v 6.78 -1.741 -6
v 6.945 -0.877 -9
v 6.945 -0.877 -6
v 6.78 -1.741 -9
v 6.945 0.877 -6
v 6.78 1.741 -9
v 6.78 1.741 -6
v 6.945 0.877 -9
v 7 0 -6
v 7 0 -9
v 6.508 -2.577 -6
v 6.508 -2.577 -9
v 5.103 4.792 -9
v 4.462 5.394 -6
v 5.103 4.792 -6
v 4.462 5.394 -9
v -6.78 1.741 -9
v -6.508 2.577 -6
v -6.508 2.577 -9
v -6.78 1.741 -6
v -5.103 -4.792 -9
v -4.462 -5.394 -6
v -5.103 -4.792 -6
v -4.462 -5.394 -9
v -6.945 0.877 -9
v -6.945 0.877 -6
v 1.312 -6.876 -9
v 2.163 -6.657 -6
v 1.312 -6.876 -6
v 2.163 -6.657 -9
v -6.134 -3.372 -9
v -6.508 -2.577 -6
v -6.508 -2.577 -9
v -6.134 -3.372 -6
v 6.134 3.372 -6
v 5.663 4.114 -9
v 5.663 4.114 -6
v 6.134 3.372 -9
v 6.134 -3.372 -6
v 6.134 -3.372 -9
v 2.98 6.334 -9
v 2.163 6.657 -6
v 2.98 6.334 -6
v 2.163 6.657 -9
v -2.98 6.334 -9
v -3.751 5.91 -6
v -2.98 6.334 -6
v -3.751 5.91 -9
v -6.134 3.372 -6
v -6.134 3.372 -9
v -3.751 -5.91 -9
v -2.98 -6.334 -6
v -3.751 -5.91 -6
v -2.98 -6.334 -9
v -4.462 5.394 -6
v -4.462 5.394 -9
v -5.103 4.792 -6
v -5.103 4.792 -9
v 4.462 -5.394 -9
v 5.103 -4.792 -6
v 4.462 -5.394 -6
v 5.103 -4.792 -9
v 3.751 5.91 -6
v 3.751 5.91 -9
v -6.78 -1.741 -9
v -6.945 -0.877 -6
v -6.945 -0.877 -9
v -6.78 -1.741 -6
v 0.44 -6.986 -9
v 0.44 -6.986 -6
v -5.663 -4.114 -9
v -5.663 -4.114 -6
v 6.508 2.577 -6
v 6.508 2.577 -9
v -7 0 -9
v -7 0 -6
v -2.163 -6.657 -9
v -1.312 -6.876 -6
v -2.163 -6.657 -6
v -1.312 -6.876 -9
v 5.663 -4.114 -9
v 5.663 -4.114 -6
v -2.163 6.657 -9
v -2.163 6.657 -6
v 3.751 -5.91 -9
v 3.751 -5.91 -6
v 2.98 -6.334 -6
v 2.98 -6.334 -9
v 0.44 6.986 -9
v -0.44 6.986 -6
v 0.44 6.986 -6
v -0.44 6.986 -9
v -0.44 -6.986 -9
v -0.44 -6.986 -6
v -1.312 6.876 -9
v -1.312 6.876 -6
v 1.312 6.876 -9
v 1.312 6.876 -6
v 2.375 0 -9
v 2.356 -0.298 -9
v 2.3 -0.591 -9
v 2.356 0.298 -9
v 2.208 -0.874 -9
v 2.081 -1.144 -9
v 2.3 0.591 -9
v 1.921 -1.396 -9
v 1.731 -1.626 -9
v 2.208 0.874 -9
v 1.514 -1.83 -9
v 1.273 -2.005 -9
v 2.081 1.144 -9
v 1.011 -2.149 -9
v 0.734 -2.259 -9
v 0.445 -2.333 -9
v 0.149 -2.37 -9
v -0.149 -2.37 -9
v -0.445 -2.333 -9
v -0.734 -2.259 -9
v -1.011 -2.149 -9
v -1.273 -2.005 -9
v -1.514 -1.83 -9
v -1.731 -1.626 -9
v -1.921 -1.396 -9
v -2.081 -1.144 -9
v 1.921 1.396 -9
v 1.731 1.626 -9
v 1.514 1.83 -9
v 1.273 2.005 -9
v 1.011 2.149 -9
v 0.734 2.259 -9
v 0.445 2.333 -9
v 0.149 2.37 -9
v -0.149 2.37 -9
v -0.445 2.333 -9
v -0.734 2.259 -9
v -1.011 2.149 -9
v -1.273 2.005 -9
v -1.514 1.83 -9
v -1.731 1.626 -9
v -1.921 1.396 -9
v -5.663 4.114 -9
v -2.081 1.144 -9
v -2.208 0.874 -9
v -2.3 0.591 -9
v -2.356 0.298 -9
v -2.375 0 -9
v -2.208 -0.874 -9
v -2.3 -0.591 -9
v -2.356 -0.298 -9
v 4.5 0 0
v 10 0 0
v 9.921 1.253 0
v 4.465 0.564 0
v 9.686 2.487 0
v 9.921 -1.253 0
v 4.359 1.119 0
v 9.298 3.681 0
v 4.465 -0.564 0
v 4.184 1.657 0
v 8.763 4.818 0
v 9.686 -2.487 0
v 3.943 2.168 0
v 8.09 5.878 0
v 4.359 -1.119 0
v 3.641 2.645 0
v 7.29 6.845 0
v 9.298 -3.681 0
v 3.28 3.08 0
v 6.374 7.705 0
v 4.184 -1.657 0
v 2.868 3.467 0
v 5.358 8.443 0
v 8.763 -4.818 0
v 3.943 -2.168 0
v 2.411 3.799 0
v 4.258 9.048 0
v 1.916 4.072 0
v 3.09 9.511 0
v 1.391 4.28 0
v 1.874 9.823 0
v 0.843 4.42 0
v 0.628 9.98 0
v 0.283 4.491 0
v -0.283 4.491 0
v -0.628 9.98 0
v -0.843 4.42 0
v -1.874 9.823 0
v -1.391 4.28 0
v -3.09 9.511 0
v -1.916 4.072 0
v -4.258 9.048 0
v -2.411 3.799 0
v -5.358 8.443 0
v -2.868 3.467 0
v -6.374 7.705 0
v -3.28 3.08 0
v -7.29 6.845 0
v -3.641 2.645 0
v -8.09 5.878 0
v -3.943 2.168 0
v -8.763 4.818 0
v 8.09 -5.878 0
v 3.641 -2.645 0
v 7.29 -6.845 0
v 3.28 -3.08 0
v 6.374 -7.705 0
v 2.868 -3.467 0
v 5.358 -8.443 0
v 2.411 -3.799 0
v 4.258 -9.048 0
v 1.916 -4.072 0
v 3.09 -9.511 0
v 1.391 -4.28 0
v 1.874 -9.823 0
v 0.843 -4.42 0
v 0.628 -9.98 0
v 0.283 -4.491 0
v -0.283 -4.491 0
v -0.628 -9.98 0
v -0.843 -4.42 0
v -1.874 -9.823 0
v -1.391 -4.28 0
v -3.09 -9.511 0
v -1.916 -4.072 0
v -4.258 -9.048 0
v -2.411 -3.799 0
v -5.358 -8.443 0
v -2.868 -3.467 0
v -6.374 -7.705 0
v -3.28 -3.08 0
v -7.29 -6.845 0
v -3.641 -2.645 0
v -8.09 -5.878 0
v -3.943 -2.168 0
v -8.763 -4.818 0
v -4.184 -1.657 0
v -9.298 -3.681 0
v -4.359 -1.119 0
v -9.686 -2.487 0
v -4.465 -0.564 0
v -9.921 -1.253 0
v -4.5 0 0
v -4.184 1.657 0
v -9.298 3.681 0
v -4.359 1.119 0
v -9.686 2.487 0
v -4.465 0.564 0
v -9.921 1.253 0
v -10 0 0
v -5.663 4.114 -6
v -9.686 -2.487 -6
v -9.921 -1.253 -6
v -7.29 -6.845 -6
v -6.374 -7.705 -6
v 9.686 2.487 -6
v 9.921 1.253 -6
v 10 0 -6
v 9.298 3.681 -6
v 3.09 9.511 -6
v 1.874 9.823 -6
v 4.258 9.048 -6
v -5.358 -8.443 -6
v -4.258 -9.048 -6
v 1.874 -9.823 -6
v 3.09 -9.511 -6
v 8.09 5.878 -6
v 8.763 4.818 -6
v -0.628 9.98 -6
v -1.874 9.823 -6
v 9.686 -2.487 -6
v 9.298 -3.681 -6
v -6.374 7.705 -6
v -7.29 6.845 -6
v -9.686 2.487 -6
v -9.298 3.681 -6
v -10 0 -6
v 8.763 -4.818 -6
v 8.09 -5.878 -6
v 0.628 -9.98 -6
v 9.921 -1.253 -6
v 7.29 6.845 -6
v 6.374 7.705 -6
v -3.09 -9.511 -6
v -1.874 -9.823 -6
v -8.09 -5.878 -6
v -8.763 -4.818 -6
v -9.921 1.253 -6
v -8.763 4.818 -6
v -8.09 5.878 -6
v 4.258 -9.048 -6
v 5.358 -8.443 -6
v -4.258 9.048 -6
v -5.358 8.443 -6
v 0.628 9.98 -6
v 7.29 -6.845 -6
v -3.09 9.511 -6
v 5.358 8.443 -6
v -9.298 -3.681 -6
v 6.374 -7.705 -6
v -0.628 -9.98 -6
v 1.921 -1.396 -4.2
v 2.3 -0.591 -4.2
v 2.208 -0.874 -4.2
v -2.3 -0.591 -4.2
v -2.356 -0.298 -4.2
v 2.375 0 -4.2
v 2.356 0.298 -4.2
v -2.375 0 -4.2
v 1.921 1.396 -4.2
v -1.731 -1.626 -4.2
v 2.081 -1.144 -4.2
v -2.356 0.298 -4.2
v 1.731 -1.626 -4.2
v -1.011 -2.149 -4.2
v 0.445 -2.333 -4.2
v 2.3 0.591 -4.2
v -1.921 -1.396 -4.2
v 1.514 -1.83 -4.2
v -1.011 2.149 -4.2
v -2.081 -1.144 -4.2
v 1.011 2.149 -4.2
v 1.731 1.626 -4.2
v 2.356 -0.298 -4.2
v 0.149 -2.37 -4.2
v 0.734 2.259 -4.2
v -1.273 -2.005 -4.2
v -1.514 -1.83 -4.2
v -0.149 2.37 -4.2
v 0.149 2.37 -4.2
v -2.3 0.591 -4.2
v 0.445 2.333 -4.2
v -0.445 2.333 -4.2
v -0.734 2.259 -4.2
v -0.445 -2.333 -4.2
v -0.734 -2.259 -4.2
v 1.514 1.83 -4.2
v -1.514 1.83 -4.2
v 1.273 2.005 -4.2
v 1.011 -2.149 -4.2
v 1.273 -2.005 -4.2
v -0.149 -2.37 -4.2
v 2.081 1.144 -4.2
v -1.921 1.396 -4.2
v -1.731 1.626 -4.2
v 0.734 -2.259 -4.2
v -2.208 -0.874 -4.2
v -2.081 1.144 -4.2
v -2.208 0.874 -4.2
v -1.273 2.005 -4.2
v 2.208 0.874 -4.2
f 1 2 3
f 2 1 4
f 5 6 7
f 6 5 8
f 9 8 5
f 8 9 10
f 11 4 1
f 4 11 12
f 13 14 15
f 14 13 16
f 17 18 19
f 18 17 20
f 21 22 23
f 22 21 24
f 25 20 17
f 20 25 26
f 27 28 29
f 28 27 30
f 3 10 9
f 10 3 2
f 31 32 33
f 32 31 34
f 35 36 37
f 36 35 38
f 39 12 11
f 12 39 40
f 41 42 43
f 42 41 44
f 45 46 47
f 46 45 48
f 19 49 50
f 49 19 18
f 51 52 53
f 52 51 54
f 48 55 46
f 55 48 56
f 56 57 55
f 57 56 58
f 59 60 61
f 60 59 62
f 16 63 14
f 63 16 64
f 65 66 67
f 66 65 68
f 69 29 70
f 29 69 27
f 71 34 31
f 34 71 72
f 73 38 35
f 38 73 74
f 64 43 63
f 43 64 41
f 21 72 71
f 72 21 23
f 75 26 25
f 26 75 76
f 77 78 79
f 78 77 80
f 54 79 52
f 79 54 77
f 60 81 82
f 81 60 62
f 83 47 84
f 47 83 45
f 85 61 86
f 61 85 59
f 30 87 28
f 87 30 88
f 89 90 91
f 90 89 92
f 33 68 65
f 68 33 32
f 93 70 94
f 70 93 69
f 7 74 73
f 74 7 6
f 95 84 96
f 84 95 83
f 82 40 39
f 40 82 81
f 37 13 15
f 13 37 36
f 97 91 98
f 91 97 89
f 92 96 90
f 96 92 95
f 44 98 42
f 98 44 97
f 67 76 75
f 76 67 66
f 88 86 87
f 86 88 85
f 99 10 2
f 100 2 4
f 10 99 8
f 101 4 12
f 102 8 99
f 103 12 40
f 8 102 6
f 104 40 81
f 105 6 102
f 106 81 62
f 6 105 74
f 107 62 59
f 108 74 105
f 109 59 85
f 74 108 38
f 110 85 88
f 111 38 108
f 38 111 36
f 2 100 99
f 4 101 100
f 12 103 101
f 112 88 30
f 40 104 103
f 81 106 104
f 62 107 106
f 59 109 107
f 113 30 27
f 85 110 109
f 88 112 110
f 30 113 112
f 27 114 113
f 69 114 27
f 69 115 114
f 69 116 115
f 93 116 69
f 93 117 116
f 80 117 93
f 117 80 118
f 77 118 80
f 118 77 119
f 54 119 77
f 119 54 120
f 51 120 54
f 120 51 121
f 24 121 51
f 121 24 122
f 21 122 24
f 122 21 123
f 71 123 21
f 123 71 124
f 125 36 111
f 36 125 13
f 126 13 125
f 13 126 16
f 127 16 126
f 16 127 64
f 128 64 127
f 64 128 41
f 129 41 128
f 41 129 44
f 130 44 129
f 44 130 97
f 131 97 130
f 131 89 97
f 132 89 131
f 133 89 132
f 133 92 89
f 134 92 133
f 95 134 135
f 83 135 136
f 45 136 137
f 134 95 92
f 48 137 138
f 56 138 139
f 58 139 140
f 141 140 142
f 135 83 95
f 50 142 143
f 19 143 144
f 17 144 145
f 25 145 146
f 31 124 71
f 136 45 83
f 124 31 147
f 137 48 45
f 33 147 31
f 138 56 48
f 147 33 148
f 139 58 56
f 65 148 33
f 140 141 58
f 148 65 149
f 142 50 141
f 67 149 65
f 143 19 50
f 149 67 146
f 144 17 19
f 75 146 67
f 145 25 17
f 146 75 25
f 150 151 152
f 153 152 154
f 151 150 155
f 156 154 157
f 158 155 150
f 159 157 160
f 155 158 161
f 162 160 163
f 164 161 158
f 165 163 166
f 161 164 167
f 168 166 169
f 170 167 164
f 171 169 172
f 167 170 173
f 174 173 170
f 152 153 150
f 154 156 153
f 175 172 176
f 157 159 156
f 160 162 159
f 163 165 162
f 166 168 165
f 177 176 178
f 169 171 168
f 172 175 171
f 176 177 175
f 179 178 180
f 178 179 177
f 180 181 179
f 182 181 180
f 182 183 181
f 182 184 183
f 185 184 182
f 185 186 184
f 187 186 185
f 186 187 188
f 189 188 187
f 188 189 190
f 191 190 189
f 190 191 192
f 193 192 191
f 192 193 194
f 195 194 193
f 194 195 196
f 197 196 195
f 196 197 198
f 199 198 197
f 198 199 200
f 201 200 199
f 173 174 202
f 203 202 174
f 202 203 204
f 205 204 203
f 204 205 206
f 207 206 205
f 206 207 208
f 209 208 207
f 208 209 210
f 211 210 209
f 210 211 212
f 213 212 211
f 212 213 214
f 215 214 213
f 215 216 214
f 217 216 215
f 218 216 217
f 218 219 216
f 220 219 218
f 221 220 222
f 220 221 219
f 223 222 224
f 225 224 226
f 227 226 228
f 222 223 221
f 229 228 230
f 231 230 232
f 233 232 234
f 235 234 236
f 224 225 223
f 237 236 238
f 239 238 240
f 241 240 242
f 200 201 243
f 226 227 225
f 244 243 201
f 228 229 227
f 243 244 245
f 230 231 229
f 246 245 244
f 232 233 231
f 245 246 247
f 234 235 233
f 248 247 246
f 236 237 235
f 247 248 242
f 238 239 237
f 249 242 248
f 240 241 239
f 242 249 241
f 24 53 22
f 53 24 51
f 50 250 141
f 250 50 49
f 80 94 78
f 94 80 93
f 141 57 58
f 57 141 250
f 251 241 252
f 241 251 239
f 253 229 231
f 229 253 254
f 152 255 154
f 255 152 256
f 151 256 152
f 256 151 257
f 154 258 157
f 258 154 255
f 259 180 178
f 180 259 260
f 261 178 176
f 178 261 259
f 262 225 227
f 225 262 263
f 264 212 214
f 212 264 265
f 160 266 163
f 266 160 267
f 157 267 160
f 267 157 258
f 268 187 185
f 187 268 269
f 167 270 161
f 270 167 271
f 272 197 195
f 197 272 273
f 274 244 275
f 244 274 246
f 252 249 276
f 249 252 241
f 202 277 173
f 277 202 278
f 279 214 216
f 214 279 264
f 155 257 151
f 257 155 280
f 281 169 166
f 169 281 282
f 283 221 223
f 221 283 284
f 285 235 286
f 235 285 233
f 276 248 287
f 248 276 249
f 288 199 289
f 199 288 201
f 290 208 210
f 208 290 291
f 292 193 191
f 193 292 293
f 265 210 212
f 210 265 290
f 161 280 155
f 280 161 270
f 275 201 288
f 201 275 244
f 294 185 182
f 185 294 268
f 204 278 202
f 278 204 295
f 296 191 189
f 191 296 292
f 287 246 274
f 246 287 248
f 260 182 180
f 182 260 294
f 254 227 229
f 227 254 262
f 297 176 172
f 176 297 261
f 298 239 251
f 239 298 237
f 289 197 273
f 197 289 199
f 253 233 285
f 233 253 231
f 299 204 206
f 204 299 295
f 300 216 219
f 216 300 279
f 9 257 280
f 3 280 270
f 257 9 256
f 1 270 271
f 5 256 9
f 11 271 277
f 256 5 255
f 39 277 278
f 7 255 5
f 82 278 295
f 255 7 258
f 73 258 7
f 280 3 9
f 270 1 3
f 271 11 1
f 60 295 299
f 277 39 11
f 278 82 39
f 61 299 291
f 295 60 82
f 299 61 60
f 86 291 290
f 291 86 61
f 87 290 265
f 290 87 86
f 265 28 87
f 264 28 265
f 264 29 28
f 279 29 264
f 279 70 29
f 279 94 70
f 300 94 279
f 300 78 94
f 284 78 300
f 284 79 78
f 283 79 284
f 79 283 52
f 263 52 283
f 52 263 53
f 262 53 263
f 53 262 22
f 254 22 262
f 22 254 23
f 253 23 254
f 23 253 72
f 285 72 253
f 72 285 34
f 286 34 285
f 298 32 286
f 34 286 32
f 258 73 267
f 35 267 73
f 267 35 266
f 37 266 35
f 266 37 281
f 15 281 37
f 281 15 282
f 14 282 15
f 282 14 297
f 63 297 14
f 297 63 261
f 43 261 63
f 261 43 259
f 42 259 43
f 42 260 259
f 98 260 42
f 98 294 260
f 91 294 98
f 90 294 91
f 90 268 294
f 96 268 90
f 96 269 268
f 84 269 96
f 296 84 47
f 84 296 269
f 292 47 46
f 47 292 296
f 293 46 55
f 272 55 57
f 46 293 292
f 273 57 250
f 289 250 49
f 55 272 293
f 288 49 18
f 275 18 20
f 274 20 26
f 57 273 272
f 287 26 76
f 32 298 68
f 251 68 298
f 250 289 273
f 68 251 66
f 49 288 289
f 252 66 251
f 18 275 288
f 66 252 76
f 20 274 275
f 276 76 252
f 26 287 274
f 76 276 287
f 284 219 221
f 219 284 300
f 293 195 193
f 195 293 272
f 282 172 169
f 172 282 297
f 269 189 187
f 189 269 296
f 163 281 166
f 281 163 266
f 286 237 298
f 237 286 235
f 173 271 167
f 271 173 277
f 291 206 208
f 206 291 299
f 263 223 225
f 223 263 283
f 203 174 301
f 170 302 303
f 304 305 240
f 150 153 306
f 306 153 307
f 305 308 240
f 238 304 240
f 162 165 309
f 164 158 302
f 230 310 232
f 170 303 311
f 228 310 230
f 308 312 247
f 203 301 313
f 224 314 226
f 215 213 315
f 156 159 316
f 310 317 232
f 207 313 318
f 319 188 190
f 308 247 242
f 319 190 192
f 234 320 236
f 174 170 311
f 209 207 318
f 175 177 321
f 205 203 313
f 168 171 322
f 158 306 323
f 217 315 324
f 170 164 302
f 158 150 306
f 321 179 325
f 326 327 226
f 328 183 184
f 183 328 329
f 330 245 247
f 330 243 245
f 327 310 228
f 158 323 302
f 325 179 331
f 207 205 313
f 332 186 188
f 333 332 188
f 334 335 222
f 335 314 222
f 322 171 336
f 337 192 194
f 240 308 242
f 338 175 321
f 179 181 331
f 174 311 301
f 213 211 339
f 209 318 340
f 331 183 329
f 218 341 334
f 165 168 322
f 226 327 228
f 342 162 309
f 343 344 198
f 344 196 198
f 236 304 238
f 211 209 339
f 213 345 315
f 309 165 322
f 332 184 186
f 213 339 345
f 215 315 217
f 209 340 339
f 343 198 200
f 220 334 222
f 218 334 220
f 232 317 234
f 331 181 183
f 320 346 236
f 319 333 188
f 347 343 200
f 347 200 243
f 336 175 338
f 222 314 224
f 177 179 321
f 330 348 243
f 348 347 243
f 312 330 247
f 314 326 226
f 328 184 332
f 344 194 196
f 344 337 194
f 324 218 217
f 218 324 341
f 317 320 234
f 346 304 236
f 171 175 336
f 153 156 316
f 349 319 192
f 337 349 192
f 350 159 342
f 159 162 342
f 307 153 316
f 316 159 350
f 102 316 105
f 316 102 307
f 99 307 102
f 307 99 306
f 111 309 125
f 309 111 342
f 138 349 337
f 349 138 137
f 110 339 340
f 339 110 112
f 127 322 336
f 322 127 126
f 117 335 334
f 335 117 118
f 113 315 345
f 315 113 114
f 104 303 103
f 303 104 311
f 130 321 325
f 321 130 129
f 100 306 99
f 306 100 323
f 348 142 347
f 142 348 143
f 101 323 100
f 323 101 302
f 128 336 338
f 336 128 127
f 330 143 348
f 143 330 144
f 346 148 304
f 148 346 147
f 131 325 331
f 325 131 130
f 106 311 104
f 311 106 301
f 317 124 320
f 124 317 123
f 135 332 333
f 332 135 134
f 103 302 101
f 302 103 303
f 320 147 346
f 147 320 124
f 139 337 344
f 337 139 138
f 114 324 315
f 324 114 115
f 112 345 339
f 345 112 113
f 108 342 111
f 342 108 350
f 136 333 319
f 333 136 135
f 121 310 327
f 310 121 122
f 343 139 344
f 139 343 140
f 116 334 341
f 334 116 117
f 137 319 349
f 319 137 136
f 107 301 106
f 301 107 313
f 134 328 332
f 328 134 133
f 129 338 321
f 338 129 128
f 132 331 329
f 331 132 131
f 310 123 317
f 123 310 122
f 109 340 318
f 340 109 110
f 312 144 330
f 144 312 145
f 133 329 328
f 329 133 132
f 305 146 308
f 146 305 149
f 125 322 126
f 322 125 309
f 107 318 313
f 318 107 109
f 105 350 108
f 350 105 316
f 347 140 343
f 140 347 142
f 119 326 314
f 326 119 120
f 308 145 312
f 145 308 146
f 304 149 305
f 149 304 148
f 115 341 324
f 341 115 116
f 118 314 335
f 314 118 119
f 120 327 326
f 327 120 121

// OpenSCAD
$fn = 50;


difference() {
	union() {
		translate(v = [0, 0, -9.0000000000]) {
			cylinder(h = 9, r = 7.0000000000);
		}
		translate(v = [0, 0, -6.0000000000]) {
			cylinder(h = 6, r = 10.0000000000);
		}
	}
	union() {
		translate(v = [0, 0, 0]) {
			rotate(a = [0, 0, 0]) {
				difference() {
					union() {
						#translate(v = [0, 0, -9.0000000000]) {
							cylinder(h = 9, r = 2.2500000000);
						}
						#translate(v = [0, 0, -4.2000000000]) {
							cylinder(h = 4.2000000000, r = 7.0000000000, r1 = 2.3750000000, r2 = 4.5000000000);
						}
						#translate(v = [0, 0, -9.0000000000]) {
							cylinder(h = 9, r = 2.3750000000);
						}
						#translate(v = [0, 0, -9.0000000000]) {
							cylinder(h = 9, r = 2.2500000000);
						}
					}
					union();
				}
			}
		}
	}
}
